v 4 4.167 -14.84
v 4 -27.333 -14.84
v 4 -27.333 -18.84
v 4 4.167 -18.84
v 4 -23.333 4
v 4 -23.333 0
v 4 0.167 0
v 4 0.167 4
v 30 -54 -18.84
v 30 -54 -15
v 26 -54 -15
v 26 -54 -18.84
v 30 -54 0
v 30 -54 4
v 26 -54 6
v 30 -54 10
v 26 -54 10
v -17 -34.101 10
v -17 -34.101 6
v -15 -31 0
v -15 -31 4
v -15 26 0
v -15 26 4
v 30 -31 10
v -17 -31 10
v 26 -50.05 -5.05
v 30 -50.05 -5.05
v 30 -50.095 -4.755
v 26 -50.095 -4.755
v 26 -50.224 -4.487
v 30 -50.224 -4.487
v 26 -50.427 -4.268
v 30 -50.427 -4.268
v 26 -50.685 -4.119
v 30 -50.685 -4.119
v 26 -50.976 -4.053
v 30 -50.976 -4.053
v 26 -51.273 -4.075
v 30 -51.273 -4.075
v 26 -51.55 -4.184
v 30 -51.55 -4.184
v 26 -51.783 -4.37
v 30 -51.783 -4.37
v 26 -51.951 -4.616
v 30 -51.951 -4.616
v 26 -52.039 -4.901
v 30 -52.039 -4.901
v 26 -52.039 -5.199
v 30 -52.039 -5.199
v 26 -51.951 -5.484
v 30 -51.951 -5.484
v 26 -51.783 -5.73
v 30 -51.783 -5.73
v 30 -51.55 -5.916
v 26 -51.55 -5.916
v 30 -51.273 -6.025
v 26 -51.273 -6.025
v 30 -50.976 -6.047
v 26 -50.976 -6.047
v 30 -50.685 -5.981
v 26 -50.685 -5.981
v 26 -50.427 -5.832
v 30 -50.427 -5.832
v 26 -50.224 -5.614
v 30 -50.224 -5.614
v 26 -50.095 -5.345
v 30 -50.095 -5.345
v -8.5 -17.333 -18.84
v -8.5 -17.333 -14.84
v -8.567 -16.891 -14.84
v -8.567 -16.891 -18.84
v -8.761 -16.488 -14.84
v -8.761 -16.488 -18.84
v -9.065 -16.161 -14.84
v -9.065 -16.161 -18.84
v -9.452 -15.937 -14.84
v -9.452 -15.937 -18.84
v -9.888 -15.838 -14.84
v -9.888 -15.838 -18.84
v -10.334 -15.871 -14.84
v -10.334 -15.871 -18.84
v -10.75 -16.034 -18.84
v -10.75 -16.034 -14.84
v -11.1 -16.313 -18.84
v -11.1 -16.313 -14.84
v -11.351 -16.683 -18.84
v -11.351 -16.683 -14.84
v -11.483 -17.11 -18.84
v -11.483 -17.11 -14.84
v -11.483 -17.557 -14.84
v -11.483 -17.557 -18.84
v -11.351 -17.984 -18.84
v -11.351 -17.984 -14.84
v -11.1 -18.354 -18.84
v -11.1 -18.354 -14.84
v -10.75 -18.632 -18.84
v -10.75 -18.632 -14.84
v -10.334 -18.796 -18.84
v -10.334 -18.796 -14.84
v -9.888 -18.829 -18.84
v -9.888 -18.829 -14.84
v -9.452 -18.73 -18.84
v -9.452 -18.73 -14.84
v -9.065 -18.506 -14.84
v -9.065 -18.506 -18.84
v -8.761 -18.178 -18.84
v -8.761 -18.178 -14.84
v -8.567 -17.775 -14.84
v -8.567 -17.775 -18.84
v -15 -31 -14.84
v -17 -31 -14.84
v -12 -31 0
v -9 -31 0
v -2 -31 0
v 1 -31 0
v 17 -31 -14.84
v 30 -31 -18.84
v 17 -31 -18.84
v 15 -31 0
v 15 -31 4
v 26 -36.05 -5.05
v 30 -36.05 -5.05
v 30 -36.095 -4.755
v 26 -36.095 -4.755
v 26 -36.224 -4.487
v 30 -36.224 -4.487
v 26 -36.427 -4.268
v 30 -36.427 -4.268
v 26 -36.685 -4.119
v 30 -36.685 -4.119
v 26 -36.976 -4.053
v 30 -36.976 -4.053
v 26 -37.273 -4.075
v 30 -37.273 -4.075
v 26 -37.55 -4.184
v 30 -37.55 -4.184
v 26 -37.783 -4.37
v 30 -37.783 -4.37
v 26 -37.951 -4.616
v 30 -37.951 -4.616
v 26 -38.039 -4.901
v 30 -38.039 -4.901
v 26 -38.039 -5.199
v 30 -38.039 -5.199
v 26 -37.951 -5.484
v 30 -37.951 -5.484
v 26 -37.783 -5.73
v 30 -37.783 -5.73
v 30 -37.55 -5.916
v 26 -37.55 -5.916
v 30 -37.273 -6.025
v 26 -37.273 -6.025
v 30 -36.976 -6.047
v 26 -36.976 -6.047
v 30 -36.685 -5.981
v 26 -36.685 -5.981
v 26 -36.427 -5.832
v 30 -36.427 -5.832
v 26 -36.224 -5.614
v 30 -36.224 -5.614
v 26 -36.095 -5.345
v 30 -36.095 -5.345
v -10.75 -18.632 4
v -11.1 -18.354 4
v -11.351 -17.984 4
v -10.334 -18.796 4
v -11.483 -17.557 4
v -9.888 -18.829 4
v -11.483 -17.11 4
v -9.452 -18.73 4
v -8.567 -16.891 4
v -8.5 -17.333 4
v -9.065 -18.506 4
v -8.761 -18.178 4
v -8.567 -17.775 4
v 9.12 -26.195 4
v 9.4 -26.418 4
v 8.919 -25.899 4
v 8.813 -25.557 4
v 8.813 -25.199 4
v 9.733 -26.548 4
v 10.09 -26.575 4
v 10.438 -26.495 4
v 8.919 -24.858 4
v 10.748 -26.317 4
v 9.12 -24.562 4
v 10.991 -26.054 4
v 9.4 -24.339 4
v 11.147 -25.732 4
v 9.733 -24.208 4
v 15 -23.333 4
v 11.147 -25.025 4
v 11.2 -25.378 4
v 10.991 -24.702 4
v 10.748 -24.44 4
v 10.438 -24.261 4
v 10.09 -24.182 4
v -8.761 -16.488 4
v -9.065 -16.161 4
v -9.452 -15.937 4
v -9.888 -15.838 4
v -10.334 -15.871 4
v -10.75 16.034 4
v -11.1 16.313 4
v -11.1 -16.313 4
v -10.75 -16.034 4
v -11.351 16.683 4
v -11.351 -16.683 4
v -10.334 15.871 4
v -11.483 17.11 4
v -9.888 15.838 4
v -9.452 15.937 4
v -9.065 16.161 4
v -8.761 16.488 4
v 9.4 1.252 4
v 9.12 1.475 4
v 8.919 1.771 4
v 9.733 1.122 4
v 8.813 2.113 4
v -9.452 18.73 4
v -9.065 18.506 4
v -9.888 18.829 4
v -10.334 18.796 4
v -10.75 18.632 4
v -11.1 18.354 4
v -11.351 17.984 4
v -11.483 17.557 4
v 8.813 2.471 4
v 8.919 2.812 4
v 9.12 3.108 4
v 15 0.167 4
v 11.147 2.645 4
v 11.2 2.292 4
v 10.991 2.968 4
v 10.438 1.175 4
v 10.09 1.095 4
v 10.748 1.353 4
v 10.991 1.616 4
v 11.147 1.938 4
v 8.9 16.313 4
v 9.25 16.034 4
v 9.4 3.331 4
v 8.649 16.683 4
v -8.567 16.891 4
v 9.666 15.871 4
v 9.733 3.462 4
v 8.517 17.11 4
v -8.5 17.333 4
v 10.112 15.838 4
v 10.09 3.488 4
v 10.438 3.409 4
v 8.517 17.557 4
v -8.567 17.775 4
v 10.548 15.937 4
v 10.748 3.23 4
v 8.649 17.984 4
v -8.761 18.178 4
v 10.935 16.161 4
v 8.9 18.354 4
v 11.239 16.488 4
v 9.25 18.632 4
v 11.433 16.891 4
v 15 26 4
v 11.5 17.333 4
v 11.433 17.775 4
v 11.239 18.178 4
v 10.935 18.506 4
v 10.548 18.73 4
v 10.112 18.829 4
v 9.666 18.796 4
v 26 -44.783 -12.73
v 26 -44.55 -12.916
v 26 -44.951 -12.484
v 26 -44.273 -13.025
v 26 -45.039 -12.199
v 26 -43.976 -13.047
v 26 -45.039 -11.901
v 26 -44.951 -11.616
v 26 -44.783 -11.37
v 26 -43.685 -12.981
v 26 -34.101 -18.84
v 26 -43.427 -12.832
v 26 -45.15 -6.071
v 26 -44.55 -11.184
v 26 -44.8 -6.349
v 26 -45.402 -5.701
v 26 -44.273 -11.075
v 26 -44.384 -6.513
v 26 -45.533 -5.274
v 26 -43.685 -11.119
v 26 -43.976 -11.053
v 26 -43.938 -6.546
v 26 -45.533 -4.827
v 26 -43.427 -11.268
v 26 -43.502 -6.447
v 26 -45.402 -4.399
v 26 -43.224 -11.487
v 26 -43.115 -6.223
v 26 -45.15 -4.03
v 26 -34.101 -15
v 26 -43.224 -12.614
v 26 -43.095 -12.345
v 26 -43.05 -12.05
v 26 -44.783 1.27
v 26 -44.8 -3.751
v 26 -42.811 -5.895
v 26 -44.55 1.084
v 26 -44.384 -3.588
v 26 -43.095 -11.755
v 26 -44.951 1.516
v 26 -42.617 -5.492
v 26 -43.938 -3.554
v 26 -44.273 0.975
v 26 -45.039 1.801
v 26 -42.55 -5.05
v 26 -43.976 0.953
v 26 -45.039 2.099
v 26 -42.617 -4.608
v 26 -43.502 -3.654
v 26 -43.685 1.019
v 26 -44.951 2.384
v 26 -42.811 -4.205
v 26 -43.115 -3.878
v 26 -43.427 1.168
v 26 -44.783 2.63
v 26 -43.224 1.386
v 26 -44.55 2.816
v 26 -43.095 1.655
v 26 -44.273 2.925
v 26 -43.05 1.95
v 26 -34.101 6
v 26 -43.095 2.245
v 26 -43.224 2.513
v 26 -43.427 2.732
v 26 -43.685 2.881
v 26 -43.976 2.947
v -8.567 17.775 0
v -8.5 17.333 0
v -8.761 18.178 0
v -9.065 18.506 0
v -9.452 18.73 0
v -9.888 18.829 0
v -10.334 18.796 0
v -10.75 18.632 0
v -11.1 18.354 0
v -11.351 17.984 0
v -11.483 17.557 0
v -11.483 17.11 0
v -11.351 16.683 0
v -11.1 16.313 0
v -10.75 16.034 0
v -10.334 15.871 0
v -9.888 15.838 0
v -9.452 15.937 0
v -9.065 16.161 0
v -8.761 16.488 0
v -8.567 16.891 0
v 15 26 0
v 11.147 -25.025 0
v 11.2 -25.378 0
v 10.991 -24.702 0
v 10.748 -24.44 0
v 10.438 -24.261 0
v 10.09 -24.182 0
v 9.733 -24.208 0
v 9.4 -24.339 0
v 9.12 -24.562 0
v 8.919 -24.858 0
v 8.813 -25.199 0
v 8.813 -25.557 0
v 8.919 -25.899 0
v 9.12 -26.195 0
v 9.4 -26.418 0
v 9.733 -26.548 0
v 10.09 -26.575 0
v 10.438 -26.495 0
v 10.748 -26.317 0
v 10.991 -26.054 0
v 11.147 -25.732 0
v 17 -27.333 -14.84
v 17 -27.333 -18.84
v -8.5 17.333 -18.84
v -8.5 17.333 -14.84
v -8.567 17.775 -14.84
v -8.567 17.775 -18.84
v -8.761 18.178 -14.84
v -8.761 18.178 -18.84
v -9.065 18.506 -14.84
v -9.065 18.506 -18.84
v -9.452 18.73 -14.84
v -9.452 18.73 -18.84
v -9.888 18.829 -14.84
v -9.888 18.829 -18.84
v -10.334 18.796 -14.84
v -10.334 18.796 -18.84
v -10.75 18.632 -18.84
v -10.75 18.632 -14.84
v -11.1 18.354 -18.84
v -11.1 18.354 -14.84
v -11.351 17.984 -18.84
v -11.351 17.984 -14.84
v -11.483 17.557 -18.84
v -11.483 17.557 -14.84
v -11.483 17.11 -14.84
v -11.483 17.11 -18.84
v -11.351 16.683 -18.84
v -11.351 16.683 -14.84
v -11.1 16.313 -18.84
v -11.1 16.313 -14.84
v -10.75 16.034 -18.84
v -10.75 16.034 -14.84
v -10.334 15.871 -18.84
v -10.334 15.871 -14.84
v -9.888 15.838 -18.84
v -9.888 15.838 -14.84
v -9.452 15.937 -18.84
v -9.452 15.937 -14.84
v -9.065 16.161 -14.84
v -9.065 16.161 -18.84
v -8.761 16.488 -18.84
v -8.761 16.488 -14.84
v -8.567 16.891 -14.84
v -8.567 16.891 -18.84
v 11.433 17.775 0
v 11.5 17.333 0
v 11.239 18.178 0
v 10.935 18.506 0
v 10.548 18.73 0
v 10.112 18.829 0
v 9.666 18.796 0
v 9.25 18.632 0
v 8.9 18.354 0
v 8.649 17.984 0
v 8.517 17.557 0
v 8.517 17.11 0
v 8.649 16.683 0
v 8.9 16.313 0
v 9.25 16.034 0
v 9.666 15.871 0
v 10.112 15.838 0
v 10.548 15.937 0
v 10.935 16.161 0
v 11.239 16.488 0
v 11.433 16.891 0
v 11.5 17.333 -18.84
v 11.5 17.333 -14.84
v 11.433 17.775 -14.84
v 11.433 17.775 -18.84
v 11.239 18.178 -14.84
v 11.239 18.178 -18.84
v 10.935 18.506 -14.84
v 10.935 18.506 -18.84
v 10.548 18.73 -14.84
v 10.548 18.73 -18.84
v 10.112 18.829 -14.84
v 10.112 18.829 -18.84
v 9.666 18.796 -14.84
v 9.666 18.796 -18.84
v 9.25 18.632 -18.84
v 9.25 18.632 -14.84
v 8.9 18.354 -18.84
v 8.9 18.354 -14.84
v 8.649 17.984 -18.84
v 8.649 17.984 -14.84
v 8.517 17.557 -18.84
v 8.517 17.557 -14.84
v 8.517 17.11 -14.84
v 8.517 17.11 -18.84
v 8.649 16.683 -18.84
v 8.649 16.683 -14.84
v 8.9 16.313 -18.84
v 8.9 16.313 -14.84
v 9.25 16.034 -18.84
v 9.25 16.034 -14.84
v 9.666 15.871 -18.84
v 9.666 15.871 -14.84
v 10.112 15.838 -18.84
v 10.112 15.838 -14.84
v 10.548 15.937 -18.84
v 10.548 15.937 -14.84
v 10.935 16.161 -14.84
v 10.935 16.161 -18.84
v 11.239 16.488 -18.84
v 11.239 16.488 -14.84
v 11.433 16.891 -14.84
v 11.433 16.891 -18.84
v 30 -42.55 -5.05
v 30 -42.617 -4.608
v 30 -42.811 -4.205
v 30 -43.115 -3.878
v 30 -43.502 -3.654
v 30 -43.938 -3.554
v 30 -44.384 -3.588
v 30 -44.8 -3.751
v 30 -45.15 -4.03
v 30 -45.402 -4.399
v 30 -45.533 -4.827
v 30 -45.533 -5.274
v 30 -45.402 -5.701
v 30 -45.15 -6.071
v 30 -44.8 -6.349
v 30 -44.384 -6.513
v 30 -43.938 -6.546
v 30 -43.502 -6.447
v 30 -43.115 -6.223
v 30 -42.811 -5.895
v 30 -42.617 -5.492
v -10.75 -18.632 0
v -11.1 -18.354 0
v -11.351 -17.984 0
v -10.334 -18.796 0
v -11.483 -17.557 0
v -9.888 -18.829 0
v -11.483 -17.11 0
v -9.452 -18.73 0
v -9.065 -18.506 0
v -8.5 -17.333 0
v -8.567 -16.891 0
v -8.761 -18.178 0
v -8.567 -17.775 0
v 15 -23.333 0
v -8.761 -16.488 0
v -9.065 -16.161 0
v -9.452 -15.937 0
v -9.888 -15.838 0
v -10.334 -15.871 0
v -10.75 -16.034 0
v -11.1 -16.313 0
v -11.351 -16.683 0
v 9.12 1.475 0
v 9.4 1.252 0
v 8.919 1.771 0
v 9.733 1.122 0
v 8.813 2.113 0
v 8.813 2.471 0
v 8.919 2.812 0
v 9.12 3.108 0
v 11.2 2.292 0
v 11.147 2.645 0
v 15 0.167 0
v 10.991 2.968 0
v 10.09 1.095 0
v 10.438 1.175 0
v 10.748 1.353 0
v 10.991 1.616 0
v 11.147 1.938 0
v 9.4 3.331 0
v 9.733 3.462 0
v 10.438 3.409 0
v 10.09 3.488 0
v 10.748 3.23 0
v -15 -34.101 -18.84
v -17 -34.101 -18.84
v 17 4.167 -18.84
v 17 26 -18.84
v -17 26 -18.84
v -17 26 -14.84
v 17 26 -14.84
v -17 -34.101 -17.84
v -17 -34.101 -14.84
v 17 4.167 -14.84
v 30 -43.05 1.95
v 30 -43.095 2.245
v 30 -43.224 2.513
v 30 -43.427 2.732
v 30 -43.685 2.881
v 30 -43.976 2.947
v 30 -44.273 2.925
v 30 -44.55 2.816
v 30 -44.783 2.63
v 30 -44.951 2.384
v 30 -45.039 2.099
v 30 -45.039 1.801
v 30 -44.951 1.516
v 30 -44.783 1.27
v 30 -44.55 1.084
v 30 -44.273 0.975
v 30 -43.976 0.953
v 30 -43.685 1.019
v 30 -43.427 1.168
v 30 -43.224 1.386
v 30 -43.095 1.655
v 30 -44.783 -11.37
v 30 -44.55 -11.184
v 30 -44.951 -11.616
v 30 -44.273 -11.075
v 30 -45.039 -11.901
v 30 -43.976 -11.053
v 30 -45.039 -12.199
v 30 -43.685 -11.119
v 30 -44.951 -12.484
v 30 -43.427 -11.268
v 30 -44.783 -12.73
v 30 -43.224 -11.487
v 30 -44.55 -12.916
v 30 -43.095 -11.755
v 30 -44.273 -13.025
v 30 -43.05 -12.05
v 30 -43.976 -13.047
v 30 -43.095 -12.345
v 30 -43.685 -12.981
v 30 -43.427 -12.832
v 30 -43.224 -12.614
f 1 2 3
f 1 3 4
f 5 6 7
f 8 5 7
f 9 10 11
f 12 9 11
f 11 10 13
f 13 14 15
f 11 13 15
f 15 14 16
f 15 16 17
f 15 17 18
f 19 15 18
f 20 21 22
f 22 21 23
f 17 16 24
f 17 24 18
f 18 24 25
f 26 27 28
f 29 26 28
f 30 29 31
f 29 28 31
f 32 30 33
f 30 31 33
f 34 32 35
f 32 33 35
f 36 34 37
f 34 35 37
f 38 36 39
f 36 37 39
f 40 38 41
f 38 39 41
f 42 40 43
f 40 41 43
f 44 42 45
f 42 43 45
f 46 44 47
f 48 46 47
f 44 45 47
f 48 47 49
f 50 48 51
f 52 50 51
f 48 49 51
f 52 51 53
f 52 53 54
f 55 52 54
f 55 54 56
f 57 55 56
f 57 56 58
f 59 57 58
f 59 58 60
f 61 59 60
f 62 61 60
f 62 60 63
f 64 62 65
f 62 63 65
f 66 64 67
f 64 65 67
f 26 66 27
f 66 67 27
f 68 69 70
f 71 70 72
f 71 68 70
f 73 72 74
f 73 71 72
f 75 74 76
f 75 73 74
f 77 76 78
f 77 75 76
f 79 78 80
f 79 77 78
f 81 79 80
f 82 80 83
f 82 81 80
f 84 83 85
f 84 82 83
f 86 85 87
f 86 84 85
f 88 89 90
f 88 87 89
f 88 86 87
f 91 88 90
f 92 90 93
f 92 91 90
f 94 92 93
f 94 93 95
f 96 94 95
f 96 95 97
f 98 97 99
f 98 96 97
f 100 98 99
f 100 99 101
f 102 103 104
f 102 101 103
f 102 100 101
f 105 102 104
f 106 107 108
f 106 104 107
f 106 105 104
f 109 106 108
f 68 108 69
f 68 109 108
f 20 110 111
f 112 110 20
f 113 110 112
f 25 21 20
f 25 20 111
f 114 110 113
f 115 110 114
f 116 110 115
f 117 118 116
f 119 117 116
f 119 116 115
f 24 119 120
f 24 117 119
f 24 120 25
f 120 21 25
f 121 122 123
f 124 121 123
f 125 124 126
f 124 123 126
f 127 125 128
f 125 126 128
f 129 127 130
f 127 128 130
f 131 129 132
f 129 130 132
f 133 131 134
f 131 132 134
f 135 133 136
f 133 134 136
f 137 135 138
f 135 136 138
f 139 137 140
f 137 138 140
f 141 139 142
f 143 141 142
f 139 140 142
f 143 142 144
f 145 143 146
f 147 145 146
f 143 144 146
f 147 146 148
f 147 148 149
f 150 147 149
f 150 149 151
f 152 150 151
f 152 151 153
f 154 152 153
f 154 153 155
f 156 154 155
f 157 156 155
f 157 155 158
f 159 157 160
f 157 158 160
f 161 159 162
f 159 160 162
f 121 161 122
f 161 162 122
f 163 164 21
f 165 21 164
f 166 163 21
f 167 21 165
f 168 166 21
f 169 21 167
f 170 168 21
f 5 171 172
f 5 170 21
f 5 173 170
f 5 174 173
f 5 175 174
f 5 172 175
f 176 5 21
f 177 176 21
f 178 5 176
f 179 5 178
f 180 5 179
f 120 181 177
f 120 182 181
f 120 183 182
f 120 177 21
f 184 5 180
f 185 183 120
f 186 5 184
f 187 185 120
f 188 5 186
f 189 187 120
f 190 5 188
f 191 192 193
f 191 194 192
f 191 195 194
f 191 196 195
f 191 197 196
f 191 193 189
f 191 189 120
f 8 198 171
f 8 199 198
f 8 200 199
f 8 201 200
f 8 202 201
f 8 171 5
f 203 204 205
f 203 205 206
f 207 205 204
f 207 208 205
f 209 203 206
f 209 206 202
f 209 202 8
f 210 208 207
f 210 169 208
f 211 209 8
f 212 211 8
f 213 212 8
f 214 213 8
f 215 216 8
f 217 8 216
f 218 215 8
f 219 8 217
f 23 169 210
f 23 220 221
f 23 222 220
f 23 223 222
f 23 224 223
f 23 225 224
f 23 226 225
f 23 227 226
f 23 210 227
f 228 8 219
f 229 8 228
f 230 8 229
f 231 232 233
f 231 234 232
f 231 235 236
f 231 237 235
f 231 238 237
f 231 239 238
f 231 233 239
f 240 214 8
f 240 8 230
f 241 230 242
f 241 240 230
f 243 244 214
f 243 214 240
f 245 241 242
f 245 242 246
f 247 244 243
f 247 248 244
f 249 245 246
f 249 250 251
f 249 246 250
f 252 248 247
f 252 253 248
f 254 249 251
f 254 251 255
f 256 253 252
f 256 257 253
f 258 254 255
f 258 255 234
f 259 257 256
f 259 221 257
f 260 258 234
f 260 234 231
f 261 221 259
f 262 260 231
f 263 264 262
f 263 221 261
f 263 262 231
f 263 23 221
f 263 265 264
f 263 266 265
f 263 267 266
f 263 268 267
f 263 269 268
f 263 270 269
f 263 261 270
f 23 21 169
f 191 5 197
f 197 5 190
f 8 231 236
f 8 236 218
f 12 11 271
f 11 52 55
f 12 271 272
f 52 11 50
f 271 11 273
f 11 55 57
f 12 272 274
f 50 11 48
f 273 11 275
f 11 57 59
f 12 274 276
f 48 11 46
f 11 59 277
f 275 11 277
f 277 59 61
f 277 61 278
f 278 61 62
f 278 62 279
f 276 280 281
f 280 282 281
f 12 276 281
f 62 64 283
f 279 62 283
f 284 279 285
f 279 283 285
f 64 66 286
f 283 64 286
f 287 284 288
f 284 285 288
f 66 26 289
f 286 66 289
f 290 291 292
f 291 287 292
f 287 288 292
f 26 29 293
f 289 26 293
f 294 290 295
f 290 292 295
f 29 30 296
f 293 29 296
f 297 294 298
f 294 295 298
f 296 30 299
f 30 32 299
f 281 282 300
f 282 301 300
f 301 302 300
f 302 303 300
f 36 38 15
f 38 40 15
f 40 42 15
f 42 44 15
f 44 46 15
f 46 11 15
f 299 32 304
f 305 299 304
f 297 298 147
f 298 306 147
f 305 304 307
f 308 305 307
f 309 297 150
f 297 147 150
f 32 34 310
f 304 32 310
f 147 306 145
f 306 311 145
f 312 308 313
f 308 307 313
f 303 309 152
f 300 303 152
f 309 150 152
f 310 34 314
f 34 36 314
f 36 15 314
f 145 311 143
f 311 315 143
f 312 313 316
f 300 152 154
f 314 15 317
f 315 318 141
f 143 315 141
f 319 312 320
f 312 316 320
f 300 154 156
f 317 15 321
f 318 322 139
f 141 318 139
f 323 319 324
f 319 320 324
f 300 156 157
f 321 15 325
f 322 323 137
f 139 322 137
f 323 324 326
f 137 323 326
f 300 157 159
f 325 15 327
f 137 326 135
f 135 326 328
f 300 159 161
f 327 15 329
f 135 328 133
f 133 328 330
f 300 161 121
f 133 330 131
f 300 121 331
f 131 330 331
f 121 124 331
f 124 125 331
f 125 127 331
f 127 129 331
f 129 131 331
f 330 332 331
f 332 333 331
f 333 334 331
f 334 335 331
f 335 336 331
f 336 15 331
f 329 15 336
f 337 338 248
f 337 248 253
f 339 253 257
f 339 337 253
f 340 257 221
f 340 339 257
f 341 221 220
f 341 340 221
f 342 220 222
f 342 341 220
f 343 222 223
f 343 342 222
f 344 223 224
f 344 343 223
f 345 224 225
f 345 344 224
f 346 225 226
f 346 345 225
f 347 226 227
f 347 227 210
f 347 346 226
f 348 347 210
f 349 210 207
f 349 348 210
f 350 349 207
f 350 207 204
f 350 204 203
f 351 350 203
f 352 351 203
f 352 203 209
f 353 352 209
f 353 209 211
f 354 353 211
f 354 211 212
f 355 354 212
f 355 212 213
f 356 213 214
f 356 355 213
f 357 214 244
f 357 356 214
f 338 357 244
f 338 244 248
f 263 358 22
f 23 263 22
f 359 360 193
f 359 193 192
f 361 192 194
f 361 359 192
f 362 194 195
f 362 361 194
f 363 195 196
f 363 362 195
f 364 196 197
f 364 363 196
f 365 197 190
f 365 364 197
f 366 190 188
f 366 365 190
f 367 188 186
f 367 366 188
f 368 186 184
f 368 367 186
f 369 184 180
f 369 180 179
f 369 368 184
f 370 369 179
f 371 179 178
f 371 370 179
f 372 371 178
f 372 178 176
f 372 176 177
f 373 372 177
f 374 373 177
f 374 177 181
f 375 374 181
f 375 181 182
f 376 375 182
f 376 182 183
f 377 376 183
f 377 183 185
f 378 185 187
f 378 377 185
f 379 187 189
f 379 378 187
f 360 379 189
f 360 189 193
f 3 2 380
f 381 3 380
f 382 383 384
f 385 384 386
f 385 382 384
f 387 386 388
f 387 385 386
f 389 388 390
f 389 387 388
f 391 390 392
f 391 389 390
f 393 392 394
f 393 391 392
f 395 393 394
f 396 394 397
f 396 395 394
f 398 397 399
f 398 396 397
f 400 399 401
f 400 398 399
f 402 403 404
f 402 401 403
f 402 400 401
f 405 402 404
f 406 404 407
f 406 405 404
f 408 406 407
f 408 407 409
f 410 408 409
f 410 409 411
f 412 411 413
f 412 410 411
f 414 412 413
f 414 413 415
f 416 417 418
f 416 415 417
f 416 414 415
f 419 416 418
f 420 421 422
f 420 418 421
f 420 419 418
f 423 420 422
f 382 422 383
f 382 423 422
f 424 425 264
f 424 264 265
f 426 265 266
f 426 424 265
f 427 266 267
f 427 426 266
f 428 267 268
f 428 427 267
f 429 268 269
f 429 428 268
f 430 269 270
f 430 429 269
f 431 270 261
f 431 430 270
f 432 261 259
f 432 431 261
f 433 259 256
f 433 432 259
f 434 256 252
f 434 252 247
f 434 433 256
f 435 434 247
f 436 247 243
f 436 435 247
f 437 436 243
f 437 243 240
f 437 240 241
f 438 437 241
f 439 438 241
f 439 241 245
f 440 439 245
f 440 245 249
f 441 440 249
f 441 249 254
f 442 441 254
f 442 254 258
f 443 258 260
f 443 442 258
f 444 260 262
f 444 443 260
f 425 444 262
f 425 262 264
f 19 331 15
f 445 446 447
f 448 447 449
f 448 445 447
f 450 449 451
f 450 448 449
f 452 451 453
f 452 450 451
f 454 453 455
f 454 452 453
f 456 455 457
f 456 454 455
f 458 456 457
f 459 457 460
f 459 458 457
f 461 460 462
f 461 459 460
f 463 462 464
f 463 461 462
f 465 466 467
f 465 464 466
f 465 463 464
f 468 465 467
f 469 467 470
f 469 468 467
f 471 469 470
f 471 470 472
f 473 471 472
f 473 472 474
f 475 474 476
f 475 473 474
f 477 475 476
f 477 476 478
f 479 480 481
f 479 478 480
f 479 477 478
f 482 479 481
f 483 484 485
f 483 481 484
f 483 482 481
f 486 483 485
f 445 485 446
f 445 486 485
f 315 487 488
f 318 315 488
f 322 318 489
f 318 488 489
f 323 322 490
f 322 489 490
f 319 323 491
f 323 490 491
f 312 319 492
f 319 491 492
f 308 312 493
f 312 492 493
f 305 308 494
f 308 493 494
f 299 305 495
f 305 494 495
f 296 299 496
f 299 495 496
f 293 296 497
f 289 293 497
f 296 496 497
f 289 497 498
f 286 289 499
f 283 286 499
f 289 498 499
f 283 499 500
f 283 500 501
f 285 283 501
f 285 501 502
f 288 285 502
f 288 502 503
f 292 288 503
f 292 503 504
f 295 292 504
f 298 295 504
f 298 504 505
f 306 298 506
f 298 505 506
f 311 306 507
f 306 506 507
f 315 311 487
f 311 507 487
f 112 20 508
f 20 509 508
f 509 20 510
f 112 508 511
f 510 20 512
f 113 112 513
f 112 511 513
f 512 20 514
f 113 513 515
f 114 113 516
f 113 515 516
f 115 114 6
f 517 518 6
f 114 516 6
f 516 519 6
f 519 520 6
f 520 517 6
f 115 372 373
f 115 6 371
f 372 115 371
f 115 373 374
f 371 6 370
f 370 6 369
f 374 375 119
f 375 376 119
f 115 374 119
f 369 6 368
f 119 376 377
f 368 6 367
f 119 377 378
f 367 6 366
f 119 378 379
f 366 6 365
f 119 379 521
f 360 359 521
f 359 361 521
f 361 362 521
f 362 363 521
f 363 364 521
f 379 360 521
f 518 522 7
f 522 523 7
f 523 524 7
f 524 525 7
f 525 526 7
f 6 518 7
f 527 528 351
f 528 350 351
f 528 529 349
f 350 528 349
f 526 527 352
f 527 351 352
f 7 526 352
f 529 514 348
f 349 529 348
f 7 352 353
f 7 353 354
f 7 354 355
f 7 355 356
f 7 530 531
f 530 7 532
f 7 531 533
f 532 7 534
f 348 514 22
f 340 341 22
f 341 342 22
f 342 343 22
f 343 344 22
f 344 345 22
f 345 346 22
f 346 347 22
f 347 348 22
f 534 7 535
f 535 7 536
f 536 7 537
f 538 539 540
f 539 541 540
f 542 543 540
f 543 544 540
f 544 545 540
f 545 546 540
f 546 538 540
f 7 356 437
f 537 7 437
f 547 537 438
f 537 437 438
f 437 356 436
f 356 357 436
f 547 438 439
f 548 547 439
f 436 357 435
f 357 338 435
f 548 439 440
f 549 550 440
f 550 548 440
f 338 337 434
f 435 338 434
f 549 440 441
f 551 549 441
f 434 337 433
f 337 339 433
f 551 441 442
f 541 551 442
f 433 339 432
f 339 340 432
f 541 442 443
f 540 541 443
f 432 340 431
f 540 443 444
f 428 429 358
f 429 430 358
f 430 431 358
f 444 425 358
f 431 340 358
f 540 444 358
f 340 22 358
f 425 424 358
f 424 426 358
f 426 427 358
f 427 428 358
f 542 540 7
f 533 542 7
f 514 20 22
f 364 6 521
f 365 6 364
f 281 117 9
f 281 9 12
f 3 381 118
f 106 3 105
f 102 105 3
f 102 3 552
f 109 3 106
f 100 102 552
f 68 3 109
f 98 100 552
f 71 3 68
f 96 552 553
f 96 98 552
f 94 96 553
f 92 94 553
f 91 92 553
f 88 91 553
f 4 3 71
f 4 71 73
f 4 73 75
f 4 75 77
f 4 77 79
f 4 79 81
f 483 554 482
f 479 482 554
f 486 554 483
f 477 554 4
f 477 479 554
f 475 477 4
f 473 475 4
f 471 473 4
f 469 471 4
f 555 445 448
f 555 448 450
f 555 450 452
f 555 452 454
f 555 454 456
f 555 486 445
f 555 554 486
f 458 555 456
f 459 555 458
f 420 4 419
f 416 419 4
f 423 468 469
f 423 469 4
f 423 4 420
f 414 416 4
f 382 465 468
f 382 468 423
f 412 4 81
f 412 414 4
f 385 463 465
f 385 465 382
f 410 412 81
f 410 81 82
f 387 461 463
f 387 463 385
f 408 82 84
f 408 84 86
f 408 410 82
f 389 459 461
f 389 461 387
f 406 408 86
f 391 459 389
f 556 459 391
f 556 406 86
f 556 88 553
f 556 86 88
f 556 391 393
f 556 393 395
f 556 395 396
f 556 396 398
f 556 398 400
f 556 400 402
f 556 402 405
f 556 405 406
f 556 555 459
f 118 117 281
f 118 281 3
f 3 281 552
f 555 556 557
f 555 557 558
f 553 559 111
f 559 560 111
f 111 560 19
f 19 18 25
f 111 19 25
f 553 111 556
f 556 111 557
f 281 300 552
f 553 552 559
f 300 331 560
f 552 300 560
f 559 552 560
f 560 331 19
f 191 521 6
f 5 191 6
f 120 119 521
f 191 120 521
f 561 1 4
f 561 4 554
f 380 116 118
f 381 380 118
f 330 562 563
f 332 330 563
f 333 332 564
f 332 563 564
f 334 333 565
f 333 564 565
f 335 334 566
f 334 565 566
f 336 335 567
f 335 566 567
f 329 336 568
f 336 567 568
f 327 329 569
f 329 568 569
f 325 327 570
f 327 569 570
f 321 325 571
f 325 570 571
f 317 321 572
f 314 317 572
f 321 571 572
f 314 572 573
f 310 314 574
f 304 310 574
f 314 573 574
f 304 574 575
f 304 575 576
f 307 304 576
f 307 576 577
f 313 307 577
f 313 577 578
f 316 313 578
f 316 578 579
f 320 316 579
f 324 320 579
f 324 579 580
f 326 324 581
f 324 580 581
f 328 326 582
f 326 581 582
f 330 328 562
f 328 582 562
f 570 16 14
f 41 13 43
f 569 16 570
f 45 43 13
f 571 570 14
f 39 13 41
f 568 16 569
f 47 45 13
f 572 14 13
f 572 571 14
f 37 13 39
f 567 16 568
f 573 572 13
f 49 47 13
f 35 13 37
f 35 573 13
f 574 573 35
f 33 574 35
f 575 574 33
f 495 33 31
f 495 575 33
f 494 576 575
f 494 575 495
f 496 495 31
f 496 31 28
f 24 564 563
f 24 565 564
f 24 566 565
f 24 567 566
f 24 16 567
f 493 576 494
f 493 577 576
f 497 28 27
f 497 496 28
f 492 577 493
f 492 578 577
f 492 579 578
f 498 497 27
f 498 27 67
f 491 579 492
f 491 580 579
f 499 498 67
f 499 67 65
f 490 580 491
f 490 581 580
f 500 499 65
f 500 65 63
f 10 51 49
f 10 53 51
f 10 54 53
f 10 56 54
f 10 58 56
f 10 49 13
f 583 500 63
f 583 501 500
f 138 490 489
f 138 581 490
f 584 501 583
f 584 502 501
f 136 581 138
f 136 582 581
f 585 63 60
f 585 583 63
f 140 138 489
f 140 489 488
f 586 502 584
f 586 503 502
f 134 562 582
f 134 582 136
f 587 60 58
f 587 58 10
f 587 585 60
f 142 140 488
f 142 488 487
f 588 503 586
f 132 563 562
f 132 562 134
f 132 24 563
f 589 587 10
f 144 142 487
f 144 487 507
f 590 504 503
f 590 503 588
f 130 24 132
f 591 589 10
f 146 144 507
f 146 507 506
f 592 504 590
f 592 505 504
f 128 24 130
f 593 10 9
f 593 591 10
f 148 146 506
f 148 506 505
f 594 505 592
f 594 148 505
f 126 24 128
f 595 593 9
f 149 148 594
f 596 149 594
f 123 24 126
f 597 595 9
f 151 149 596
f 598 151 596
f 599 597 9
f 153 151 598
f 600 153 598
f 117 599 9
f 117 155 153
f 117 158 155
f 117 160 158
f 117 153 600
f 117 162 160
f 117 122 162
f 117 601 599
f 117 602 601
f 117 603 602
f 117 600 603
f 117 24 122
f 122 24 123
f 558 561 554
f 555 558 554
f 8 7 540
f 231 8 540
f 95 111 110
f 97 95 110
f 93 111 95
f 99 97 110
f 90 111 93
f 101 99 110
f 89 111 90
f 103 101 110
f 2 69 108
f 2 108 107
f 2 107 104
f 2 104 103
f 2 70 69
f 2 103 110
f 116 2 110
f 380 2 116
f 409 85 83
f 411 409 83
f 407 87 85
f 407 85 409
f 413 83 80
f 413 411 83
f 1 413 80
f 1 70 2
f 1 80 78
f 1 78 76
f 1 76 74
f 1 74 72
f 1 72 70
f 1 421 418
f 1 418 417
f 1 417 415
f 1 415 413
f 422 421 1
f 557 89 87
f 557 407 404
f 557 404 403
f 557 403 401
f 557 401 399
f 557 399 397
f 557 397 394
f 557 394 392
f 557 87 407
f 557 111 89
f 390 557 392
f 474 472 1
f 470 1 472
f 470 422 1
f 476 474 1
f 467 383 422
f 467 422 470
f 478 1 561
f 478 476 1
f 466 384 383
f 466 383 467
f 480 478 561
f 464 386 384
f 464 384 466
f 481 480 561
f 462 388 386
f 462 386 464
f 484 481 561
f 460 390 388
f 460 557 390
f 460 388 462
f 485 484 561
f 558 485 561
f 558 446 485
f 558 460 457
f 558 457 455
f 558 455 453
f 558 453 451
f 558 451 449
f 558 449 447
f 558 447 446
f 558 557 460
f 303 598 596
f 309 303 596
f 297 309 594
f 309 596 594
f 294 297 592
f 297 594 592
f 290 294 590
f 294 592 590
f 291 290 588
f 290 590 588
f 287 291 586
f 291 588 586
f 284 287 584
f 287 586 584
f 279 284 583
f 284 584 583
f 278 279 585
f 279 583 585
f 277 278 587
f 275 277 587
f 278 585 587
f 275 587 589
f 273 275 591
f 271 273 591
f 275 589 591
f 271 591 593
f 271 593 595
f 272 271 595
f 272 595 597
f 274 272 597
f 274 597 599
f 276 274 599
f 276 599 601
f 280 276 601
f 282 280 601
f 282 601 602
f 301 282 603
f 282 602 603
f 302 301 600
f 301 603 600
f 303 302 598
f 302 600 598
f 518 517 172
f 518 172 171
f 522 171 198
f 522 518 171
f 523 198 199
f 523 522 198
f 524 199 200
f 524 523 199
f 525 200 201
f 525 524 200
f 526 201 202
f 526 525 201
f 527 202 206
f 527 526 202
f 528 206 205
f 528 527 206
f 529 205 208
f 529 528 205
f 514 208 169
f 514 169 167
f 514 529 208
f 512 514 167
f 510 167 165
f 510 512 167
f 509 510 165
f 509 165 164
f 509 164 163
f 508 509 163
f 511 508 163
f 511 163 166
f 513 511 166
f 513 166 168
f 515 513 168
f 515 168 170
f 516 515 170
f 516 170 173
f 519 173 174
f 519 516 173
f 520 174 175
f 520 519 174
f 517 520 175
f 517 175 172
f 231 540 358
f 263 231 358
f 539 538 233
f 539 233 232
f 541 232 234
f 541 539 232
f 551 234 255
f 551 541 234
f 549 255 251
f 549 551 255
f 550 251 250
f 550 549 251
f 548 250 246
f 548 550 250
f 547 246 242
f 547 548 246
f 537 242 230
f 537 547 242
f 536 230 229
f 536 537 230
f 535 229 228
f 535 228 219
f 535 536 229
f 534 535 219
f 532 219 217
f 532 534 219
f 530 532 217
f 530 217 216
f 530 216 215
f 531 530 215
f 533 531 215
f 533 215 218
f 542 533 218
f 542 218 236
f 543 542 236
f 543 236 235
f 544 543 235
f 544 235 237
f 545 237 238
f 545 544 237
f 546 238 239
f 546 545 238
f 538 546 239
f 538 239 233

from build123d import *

# Parameters (mm, degrees)
SKETCH_1_R           = 1.5
SKETCH_1_R_2         = 1.2
EXTRUDE_1_DEPTH      = 4
SKETCH_2_W           = 19.899494937
SKETCH_2_H           = 19.899494937
SKETCH_2_R           = 1.5
EXTRUDE_2_DEPTH      = 4
EXTRUDE_3_DEPTH      = 15
EXTRUDE_3_DEPTH_BACK = 10
SKETCH_3_W           = 45
SKETCH_3_H           = 3.100505063
SKETCH_4_W           = 14.84
SKETCH_4_H           = 5
EXTRUDE_4_DEPTH      = 16
SKETCH_4_3_W         = 14.84
SKETCH_4_3_H         = 5
CUT_EXTRUDE_1_DEPTH  = 13
EXTRUDE_5_DEPTH      = 6
SKETCH_4_6_W         = 14.84
SKETCH_4_6_H         = 5
CUT_EXTRUDE_4_DEPTH  = 3
SKETCH_7_W           = 41
SKETCH_7_H           = 19.899494937
CUT_EXTRUDE_6_DEPTH  = 4
EXTRUDE_7_DEPTH      = 4
SKETCH_12_R          = 1.5
CUT_EXTRUDE_8_DEPTH  = 4
SKETCH_13_W          = 4
SKETCH_13_H          = 19.899494937
EXTRUDE_8_DEPTH      = 5.100505063
SKETCH_14_R          = 1.5
CUT_EXTRUDE_9_DEPTH  = 4
EXTRUDE_9_DEPTH      = 3.84
SKETCH_16_W          = 34
SKETCH_16_H          = 4
EXTRUDE_10_DEPTH     = 57
CUT_EXTRUDE_START    = -22.84
SKETCH_17_R          = 1.5
CUT_EXTRUDE_10_DEPTH = 22.84
SKETCH_18_W          = 2
SKETCH_18_H          = 3
EXTRUDE_11_DEPTH     = 3.100505063
SKETCH_19_W          = 24.84
SKETCH_19_H          = 3.100505063
EXTRUDE_12_DEPTH     = 2
EXTRUDE_13_DEPTH     = 4
SKETCH_21_W          = 13
SKETCH_21_H          = 31.5
CUT_EXTRUDE_11_DEPTH = 4
SKETCH_4_7_W         = 14.84
SKETCH_4_7_H         = 5
CUT_EXTRUDE_12_DEPTH = 16
SKETCH_22_W          = 2
SKETCH_22_H          = 3.100505063
EXTRUDE_14_DEPTH     = 1
SKETCH_23_R          = 1.5
EXTRUDE_15_DEPTH     = 4
SKETCH_24_R          = 1
CUT_EXTRUDE_13_DEPTH = 4


with BuildPart() as part:
    # 草图1 → 凸台-拉伸1 (new body)
    with BuildSketch(Plane.XY):
        Polygon((-15, -26), (-15, -54), (30, -54), (30, -31), (15, -31), (15, -26), (15, -23.333333333), (4, -23.333333333), (4, 0.166666667), (15, 0.166666667), (15, 26), (-15, 26), align=None)
        with Locations((-10, 17.333333333)):
            Circle(SKETCH_1_R, mode=Mode.SUBTRACT)
        with Locations((10, 17.333333333)):
            Circle(SKETCH_1_R, mode=Mode.SUBTRACT)
        with Locations((-10, -17.333333333)):
            Circle(SKETCH_1_R, mode=Mode.SUBTRACT)
        with Locations((10, 2.291666667)):
            Circle(SKETCH_1_R_2, mode=Mode.SUBTRACT)
        with Locations((10, -25.378333333)):
            Circle(SKETCH_1_R_2, mode=Mode.SUBTRACT)
    extrude(amount=EXTRUDE_1_DEPTH)

    # 草图2 → 凸台-拉伸2 (add)
    with BuildSketch(Plane(origin=(30, 0, 0), x_dir=(0, 0, -1), z_dir=(1, 0, 0))):
        with Locations((5.050252532, -44.050252531)):
            Rectangle(SKETCH_2_W, SKETCH_2_H)
        with Locations((0.100505063, -39.100505063)):
            Circle(SKETCH_2_R, mode=Mode.SUBTRACT)
        with Locations((10, -39.100505063)):
            Circle(SKETCH_2_R, mode=Mode.SUBTRACT)
        with Locations((0.100505063, -49)):
            Circle(SKETCH_2_R, mode=Mode.SUBTRACT)
        with Locations((10, -49)):
            Circle(SKETCH_2_R, mode=Mode.SUBTRACT)
    extrude(amount=-EXTRUDE_2_DEPTH)

    # 草图3 → 凸台-拉伸3 (add, two sides: drawn at the far end of the back side and taken through both)
    with BuildSketch(Plane(origin=(0, 0, 0), x_dir=(-1, 0, 0), z_dir=(0, 0, -1)).offset(-EXTRUDE_3_DEPTH_BACK)):
        with Locations((-7.5, -32.550252531)):
            Rectangle(SKETCH_3_W, SKETCH_3_H)
    extrude(amount=EXTRUDE_3_DEPTH + EXTRUDE_3_DEPTH_BACK)

    # 草图7 → 切除-拉伸6 (cut)
    with BuildSketch(Plane(origin=(0, 0, 0), x_dir=(-1, 0, 0), z_dir=(0, 0, -1))):
        with Locations((-5.5, -44.050252531)):
            Rectangle(SKETCH_7_W, SKETCH_7_H)
    extrude(amount=-CUT_EXTRUDE_6_DEPTH, mode=Mode.SUBTRACT)

    # 草图10 → 凸台-拉伸7 (add)
    with BuildSketch(Plane.XY.offset(10)):
        Polygon((26, -54), (-15, -34.100505063), (26, -34.100505063), align=None)
    extrude(amount=-EXTRUDE_7_DEPTH)

    # 草图12 → 切除-拉伸8 (cut)
    with BuildSketch(Plane(origin=(30, 0, 0), x_dir=(0, 0, -1), z_dir=(1, 0, 0))):
        with Locations(Location((5.050252532, -44.050252532, 0), (0, 0, 90))):
            Circle(SKETCH_12_R)
    extrude(amount=-CUT_EXTRUDE_8_DEPTH, mode=Mode.SUBTRACT)

    # 草图13 → 凸台-拉伸8 (add)
    with BuildSketch(Plane.XY.offset(4.899494937)):
        with Locations((28, -44.050252531)):
            Rectangle(SKETCH_13_W, SKETCH_13_H)
    extrude(amount=EXTRUDE_8_DEPTH)

    # 草图14 → 切除-拉伸9 (cut)
    with BuildSketch(Plane(origin=(30, 0, 0), x_dir=(0, 0, -1), z_dir=(1, 0, 0))):
        with Locations((0.100505063, -49)):
            Circle(SKETCH_14_R)
        with Locations((0.100505063, -39.100505063)):
            Circle(SKETCH_14_R)
    extrude(amount=-CUT_EXTRUDE_9_DEPTH, mode=Mode.SUBTRACT)

    # 草图15 → 凸台-拉伸9 (add)
    with BuildSketch(Plane(origin=(0, 0, -15), x_dir=(-1, 0, 0), z_dir=(0, 0, -1))):
        Polygon((-30, -31), (-30, -54), (-26, -54), (-26, -34.100505063), (15, -34.100505063), (15, -31), align=None)
    extrude(amount=EXTRUDE_9_DEPTH)



with BuildPart() as body_2:
    # 草图4 → 凸台-拉伸4 (new body)
    with BuildSketch(Plane.ZY.offset(15)):
        with Locations((-7.42, -28.5)):
            Rectangle(SKETCH_4_W, SKETCH_4_H)
    extrude(amount=-EXTRUDE_4_DEPTH)

    # 草图4<3> → 切除-拉伸1 (cut)
    with BuildSketch(Plane.ZY.offset(15)):
        with Locations((-7.42, -28.5)):
            Rectangle(SKETCH_4_3_W, SKETCH_4_3_H)
    extrude(amount=-CUT_EXTRUDE_1_DEPTH, mode=Mode.SUBTRACT)


with BuildPart() as body_3:
    # 草图4 → 凸台-拉伸5 (new body)
    with BuildSketch(Plane.ZY.offset(15)):
        with Locations((-7.42, -28.5)):
            Rectangle(SKETCH_4_W, SKETCH_4_H)
    extrude(amount=-EXTRUDE_5_DEPTH)

    # 草图4<6> → 切除-拉伸4 (cut)
    with BuildSketch(Plane.ZY.offset(15)):
        with Locations((-7.42, -28.5)):
            Rectangle(SKETCH_4_6_W, SKETCH_4_6_H)
    extrude(amount=-CUT_EXTRUDE_4_DEPTH, mode=Mode.SUBTRACT)


with BuildPart() as part_1:
    add(part.part)

    add(body_2.part)  # 凸台-拉伸10 merges body 2

    add(body_3.part)  # 凸台-拉伸10 merges body 3
    # 草图16 → 凸台-拉伸10 (add)
    with BuildSketch(Plane(origin=(0, -31, 0), x_dir=(1, 0, 0), z_dir=(0, 1, 0))):
        with Locations((0, 16.84)):
            Rectangle(SKETCH_16_W, SKETCH_16_H)
    extrude(amount=EXTRUDE_10_DEPTH)

    # 草图17 → 切除-拉伸10 (cut)
    with BuildSketch(Plane.XY.offset(4).offset(CUT_EXTRUDE_START)):
        with Locations((-10, -17.333333333)):
            Circle(SKETCH_17_R)
        with Locations((-10, 17.333333333)):
            Circle(SKETCH_17_R)
        with Locations((10, 17.333333333)):
            Circle(SKETCH_17_R)
    extrude(amount=CUT_EXTRUDE_10_DEPTH, mode=Mode.SUBTRACT)

    # 草图18 → 凸台-拉伸11 (add)
    with BuildSketch(Plane.XZ.offset(31)):
        with Locations((-16, -16.34)):
            Rectangle(SKETCH_18_W, SKETCH_18_H)
    extrude(amount=EXTRUDE_11_DEPTH)

    # 草图19 → 凸台-拉伸12 (add)
    with BuildSketch(Plane.ZY.offset(15)):
        with Locations((-2.42, -32.550252531)):
            Rectangle(SKETCH_19_W, SKETCH_19_H)
    extrude(amount=EXTRUDE_12_DEPTH)

    # 草图20 → 凸台-拉伸13 (add)
    with BuildSketch(Plane.XY.offset(10)):
        Polygon((26, -54), (-17, -34.100505063), (26, -34.100505063), align=None)
    extrude(amount=-EXTRUDE_13_DEPTH)

    # 草图21 → 切除-拉伸11 (cut)
    with BuildSketch(Plane.XY.offset(-14.84)):
        with Locations((10.5, -11.583333333)):
            Rectangle(SKETCH_21_W, SKETCH_21_H)
    extrude(amount=-CUT_EXTRUDE_11_DEPTH, mode=Mode.SUBTRACT)

    # 草图4<7> → 切除-拉伸12 (cut)
    with BuildSketch(Plane.ZY.offset(15)):
        with Locations((-7.42, -28.5)):
            Rectangle(SKETCH_4_7_W, SKETCH_4_7_H)
    extrude(amount=-CUT_EXTRUDE_12_DEPTH, mode=Mode.SUBTRACT)

    # 草图22 → 凸台-拉伸14 (add)
    with BuildSketch(Plane(origin=(0, 0, -17.84), x_dir=(-1, 0, 0), z_dir=(0, 0, -1))):
        with Locations((16, -32.550252531)):
            Rectangle(SKETCH_22_W, SKETCH_22_H)
    extrude(amount=EXTRUDE_14_DEPTH)

    # 草图23 → 凸台-拉伸15 (add)
    with BuildSketch(Plane(origin=(30, 0, 0), x_dir=(0, 0, -1), z_dir=(1, 0, 0))):
        with Locations((0.100505063, -49)):
            Circle(SKETCH_23_R)
        with Locations((0.100505063, -39.100505063)):
            Circle(SKETCH_23_R)
        with Locations((10, -49)):
            Circle(SKETCH_23_R)
        with Locations((10, -39.100505063)):
            Circle(SKETCH_23_R)
    extrude(amount=-EXTRUDE_15_DEPTH)

    # 草图24 → 切除-拉伸13 (cut)
    with BuildSketch(Plane(origin=(30, 0, 0), x_dir=(0, 0, -1), z_dir=(1, 0, 0))):
        with Locations(Location((-1.949747468, -44.050252532, 0), (0, 0, 90))):
            Circle(SKETCH_24_R)
        with Locations(Location((12.050252532, -44.050252532, 0), (0, 0, 90))):
            Circle(SKETCH_24_R)
        with Locations(Location((5.050252532, -37.050252532, 0), (0, 0, 90))):
            Circle(SKETCH_24_R)
        with Locations(Location((5.050252532, -51.050252532, 0), (0, 0, 90))):
            Circle(SKETCH_24_R)
    extrude(amount=-CUT_EXTRUDE_13_DEPTH, mode=Mode.SUBTRACT)


solid = part_1.part
